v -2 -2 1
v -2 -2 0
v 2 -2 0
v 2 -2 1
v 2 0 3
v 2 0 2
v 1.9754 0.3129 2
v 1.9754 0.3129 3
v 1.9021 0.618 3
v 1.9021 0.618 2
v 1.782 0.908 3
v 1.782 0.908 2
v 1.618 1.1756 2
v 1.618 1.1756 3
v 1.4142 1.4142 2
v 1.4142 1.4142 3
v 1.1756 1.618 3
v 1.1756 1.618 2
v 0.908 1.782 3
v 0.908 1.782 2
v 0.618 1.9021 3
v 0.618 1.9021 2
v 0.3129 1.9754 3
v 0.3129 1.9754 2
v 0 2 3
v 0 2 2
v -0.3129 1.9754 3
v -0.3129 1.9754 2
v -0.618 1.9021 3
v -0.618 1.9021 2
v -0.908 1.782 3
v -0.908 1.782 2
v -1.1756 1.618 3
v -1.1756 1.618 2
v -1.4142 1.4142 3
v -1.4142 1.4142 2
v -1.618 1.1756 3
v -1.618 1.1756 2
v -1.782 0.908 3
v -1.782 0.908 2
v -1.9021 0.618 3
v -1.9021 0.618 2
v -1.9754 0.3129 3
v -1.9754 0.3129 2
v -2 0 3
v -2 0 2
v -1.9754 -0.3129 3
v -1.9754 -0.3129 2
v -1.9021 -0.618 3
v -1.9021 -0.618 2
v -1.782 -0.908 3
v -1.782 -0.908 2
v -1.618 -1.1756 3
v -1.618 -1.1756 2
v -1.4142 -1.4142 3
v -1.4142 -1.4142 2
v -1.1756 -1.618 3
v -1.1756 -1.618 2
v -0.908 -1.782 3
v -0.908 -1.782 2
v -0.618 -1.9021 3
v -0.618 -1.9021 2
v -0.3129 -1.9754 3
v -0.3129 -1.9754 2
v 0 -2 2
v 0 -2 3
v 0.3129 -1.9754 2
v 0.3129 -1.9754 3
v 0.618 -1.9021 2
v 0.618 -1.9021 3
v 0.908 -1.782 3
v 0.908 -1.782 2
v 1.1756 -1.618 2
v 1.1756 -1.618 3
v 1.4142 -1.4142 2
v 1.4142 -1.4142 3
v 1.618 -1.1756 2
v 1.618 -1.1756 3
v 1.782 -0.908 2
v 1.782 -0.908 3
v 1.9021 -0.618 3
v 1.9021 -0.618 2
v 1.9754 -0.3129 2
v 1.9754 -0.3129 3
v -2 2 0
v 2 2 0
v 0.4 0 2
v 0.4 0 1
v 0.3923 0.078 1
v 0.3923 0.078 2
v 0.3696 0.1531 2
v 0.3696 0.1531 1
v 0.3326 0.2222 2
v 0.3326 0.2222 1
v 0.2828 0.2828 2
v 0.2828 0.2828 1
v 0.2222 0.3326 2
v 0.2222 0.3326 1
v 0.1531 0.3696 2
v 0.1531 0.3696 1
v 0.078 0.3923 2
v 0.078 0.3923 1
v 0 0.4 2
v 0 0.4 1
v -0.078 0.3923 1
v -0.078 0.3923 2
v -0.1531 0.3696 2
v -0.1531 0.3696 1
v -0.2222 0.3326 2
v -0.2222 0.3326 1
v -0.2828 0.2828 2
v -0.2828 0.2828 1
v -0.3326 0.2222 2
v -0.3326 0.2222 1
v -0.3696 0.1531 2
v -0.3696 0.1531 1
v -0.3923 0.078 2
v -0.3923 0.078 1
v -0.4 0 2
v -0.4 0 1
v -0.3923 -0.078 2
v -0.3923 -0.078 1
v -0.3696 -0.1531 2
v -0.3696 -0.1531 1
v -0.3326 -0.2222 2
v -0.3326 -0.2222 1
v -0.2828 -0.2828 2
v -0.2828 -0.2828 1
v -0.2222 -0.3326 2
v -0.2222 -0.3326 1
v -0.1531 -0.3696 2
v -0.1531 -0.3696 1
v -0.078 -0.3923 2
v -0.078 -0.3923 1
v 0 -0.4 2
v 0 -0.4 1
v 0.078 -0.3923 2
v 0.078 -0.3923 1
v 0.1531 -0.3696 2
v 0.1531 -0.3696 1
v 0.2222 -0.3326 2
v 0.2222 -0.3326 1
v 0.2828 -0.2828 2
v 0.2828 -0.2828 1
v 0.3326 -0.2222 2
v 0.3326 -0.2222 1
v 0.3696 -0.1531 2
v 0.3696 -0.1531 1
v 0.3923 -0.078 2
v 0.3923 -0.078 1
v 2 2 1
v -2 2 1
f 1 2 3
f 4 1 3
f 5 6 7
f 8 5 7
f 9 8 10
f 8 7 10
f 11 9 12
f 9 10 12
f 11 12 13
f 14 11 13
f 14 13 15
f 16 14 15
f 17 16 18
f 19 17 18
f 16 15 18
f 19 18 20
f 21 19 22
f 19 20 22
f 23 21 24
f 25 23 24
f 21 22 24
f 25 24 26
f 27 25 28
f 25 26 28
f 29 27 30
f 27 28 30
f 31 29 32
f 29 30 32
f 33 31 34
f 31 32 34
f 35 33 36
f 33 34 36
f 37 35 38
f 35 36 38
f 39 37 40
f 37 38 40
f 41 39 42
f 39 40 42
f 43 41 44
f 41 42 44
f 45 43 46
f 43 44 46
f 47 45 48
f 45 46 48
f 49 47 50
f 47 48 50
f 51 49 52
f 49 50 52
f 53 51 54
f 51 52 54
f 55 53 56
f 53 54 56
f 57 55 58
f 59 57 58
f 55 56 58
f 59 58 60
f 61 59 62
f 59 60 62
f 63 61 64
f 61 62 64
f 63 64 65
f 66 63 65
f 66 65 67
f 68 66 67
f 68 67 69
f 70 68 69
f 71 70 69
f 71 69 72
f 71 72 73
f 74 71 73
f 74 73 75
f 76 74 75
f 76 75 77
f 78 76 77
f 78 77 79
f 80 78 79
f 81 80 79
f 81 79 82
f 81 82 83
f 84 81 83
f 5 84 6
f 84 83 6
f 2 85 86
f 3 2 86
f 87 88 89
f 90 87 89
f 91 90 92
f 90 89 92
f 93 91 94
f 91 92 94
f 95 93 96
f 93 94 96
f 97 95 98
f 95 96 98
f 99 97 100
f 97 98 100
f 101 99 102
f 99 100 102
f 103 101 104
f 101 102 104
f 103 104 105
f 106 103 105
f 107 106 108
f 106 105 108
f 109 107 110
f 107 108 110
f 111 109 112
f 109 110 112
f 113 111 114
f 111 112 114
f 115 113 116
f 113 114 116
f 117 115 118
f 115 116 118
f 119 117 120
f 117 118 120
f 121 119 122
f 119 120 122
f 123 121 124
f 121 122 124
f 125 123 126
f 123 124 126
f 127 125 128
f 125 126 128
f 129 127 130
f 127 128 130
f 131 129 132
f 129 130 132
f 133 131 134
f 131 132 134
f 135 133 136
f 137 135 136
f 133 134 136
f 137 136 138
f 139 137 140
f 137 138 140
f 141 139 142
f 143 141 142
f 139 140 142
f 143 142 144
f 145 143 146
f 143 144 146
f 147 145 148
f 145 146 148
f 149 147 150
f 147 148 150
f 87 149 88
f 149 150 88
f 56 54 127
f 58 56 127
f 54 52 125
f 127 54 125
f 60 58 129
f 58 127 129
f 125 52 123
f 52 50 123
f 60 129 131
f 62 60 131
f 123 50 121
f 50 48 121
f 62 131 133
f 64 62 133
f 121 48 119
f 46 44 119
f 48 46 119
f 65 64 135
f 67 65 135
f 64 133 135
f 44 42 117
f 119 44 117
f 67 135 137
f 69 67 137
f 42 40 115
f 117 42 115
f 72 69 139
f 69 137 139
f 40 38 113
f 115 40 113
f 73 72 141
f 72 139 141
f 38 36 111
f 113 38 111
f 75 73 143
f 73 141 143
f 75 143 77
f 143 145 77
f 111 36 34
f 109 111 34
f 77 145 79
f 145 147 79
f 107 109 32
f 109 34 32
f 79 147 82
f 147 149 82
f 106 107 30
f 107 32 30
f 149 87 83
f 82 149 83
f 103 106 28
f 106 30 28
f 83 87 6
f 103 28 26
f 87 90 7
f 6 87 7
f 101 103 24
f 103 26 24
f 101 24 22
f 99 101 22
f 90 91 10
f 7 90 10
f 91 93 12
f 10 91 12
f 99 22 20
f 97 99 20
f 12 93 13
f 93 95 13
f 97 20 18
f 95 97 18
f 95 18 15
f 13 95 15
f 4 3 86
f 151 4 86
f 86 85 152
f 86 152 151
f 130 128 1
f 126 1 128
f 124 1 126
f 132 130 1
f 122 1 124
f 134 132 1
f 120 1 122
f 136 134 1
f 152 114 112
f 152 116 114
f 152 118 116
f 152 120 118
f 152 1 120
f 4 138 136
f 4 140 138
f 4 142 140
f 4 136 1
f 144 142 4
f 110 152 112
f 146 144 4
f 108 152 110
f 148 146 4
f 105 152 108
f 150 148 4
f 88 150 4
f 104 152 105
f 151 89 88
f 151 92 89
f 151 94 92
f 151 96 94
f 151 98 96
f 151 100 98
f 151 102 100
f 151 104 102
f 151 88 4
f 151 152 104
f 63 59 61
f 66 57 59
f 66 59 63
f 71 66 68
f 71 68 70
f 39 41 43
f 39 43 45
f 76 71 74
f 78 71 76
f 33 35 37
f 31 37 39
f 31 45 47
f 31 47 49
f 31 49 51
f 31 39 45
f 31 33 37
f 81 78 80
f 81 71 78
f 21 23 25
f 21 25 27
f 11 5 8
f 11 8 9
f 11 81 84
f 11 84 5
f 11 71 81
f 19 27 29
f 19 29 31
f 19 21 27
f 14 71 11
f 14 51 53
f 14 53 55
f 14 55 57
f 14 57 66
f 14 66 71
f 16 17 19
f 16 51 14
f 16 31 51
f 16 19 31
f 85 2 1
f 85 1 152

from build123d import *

# Parameters (mm, degrees)
SKETCH_1_W      = 4
SKETCH_1_H      = 4
EXTRUDE_1_DEPTH = 1
SKETCH_2_R      = 0.4
EXTRUDE_2_DEPTH = 1
SKETCH_3_R      = 2
EXTRUDE_3_DEPTH = 1


with BuildPart() as part:
    # 草圖1 → 填料-伸長1 (new body)
    with BuildSketch(Plane.XY):
        Rectangle(SKETCH_1_W, SKETCH_1_H)
    extrude(amount=EXTRUDE_1_DEPTH)

    # 草圖2 → 填料-伸長2 (add)
    with BuildSketch(Plane.XY.offset(1)):
        Circle(SKETCH_2_R)
    extrude(amount=EXTRUDE_2_DEPTH)

    # 草圖3 → 填料-伸長3 (add)
    with BuildSketch(Plane.XY.offset(2)):
        Circle(SKETCH_3_R)
    extrude(amount=EXTRUDE_3_DEPTH)


solid = part.part
